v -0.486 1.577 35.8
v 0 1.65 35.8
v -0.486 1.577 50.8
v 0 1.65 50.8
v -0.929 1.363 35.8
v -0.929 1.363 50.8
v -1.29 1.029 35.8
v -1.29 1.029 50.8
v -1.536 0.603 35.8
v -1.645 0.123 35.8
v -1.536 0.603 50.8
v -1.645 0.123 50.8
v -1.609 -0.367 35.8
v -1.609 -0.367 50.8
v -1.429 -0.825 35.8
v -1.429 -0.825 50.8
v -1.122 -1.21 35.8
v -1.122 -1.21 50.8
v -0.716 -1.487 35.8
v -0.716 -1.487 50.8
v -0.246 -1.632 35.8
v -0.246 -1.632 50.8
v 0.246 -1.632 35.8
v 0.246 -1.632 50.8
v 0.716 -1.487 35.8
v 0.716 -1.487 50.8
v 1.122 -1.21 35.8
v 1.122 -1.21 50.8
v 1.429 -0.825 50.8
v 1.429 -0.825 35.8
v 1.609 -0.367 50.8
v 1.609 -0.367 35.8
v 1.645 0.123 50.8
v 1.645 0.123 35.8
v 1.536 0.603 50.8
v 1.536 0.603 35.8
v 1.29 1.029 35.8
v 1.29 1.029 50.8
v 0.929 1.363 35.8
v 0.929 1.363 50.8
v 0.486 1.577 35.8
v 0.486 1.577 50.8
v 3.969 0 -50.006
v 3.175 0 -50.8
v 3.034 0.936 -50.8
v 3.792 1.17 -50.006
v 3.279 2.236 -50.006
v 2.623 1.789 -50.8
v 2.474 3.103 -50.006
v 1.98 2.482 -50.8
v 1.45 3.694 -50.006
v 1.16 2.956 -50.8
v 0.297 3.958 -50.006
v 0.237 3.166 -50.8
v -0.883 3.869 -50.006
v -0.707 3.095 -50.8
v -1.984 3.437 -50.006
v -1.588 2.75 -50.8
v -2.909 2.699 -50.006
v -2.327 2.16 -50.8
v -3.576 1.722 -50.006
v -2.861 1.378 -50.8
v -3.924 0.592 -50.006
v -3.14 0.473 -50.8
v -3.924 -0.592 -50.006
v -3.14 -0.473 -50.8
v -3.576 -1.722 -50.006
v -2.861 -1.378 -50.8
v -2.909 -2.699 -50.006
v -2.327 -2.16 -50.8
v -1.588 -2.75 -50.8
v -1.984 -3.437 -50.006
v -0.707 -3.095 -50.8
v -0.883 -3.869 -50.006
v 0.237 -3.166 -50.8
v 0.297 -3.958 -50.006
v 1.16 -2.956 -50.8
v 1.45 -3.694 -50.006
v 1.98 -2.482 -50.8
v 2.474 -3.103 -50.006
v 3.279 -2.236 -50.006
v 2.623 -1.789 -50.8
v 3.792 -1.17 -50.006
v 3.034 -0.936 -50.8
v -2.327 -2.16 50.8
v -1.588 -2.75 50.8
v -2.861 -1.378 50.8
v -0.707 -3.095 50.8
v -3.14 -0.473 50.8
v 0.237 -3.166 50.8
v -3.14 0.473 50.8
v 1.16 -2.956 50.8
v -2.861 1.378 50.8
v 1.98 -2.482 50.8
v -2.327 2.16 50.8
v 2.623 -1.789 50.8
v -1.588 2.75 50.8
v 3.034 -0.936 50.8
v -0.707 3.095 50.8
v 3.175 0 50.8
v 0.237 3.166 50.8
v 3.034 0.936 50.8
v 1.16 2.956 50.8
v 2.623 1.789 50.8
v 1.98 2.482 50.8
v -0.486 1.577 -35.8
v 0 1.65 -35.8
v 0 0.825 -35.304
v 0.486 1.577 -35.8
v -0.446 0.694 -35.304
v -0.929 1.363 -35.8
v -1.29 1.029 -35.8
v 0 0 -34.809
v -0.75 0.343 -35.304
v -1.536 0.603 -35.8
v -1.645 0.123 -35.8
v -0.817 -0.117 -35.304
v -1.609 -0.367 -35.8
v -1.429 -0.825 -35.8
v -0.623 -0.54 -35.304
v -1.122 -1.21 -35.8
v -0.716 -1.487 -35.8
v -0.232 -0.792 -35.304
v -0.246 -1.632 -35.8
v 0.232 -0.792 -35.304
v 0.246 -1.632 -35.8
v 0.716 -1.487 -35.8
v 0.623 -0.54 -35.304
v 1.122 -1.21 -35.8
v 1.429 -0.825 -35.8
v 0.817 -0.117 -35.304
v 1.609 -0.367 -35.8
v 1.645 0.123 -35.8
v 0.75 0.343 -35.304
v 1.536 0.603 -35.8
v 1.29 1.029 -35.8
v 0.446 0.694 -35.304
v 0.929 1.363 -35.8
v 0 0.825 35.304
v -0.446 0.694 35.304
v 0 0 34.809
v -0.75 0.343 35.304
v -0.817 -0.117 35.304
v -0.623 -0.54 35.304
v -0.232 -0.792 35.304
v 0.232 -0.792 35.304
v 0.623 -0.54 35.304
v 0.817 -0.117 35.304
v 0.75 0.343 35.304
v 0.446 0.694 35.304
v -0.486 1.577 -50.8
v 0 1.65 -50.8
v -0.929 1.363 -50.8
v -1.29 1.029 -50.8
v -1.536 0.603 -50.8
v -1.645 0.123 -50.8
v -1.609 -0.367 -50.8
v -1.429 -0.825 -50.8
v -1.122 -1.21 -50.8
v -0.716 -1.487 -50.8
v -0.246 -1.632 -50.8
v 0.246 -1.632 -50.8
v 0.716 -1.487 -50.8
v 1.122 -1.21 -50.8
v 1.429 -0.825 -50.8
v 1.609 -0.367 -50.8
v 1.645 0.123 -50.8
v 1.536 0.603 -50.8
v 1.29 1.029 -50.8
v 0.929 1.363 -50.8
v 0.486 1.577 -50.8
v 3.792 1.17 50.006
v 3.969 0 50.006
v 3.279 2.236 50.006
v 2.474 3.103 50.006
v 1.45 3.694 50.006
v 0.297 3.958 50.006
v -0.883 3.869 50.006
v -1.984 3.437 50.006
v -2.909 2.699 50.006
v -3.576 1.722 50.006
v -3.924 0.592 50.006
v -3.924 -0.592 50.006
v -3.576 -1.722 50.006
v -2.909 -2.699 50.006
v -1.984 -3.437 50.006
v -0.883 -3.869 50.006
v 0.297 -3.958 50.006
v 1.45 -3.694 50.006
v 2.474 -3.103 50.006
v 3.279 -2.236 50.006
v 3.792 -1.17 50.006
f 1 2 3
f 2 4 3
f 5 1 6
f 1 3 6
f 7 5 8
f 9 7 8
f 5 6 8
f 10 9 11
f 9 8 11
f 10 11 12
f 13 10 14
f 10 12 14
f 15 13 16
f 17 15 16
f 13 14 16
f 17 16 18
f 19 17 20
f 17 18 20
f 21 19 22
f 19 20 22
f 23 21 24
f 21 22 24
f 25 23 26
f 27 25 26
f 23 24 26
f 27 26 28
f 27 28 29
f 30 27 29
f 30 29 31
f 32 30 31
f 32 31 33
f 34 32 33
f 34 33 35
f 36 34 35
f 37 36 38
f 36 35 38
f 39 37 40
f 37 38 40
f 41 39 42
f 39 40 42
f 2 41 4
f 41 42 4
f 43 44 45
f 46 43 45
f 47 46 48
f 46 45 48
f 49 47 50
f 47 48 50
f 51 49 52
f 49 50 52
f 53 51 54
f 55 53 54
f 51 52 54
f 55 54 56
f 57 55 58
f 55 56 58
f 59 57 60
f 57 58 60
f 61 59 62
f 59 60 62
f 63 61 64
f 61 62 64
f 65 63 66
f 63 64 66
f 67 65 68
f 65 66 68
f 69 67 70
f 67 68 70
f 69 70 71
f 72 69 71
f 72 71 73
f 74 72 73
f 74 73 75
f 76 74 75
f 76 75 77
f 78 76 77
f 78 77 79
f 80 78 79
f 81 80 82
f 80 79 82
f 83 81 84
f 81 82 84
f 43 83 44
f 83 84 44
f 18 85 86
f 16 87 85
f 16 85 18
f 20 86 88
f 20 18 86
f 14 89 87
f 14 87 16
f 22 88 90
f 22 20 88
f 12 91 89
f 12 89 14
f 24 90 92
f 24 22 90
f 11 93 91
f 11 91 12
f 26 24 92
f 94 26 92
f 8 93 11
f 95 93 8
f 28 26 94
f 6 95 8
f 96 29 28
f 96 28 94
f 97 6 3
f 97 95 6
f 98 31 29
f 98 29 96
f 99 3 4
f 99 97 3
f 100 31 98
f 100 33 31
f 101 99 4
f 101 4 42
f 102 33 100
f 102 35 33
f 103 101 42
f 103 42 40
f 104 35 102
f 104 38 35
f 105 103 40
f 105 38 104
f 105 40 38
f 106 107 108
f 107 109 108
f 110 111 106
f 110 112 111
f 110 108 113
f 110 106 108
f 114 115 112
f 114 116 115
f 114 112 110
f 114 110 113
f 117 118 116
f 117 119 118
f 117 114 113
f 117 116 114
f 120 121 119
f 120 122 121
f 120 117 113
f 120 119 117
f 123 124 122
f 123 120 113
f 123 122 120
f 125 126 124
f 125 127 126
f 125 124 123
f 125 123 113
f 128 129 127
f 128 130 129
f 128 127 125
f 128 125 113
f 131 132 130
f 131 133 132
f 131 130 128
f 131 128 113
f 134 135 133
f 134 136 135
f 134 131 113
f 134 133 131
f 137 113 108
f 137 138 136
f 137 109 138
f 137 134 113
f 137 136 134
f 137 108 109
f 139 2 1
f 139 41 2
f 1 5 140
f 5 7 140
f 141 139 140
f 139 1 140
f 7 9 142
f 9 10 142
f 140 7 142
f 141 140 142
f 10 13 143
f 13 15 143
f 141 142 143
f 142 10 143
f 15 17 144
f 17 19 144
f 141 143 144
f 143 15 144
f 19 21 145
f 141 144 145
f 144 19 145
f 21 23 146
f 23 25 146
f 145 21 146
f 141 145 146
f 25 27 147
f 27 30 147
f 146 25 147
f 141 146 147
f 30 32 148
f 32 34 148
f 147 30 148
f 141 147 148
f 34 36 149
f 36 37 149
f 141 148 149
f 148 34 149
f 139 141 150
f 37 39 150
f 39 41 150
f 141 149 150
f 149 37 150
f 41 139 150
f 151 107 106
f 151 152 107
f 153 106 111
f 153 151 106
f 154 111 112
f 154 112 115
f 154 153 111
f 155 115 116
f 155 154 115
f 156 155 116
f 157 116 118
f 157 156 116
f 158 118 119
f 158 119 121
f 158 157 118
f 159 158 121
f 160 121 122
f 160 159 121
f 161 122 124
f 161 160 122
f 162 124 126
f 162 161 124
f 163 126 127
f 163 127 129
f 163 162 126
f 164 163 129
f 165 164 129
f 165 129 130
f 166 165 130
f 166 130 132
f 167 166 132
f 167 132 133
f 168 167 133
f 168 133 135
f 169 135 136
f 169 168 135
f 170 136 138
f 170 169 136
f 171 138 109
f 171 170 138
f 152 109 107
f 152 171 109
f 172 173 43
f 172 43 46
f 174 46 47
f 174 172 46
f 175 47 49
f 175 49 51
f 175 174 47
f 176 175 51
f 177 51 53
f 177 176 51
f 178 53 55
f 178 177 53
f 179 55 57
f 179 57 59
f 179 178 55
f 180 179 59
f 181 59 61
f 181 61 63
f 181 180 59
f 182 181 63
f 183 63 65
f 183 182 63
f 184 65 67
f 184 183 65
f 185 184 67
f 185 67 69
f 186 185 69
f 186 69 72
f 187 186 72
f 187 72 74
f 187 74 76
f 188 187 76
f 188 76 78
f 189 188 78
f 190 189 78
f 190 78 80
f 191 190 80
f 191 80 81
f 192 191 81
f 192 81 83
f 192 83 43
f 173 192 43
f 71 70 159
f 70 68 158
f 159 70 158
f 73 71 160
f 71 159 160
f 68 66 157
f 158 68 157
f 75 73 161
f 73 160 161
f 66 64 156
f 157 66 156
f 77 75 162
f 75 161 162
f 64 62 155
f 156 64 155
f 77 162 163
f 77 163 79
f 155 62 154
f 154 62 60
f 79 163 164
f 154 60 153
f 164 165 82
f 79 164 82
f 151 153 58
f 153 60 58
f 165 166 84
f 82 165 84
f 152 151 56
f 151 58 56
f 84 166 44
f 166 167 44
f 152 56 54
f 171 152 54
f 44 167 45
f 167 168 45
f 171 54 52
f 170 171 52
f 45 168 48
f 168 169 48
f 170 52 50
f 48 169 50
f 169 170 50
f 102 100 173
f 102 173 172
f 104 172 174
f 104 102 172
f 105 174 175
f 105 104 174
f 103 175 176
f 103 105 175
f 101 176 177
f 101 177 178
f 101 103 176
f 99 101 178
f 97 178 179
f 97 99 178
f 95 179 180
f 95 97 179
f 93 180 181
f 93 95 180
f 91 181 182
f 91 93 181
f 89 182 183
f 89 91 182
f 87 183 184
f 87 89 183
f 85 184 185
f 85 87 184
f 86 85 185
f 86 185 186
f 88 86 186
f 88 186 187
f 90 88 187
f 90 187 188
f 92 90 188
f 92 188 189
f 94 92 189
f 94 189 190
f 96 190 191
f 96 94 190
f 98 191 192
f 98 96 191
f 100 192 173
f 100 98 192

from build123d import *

# Parameters (mm, degrees)
SKETCH3_R           = 3.96875
BOSS_EXTRUDE1_DEPTH = 50.8
CHAMFER1_SIZE       = 0.79375


with BuildPart() as part:
    # Sketch3 → Boss-Extrude1 (new body, symmetric)
    with BuildSketch(Plane.XY):
        Circle(SKETCH3_R)
    extrude(amount=BOSS_EXTRUDE1_DEPTH, both=True)

    # Chamfer1
    chamfer1_edges = [part.edges().sort_by_distance(p)[0] for p in [
        (-3.96875, 0, -50.8),
        (-3.96875, 0, 50.8),
    ]]
    chamfer(chamfer1_edges, length=CHAMFER1_SIZE)

    # Sketch6 → M4x0.7 Tapped Hole1 (revolve, cut)
    with BuildSketch(Plane(origin=(0, 0, -50.8), x_dir=(0, 1, 0), z_dir=(1, 0, 0))):
        Polygon((0, 0), (0, 15.991420021), (1.65, 15), (1.65, 0), align=None)
    m4x0_7_tapped_hole1 = revolve(axis=Axis((0, 0, -57.15), (0, 0, 1)), mode=Mode.SUBTRACT)

    # Mirror1: M4x0.7 Tapped Hole1 across plane
    add(m4x0_7_tapped_hole1.mirror(Plane.XY), mode=Mode.SUBTRACT)


solid = part.part
